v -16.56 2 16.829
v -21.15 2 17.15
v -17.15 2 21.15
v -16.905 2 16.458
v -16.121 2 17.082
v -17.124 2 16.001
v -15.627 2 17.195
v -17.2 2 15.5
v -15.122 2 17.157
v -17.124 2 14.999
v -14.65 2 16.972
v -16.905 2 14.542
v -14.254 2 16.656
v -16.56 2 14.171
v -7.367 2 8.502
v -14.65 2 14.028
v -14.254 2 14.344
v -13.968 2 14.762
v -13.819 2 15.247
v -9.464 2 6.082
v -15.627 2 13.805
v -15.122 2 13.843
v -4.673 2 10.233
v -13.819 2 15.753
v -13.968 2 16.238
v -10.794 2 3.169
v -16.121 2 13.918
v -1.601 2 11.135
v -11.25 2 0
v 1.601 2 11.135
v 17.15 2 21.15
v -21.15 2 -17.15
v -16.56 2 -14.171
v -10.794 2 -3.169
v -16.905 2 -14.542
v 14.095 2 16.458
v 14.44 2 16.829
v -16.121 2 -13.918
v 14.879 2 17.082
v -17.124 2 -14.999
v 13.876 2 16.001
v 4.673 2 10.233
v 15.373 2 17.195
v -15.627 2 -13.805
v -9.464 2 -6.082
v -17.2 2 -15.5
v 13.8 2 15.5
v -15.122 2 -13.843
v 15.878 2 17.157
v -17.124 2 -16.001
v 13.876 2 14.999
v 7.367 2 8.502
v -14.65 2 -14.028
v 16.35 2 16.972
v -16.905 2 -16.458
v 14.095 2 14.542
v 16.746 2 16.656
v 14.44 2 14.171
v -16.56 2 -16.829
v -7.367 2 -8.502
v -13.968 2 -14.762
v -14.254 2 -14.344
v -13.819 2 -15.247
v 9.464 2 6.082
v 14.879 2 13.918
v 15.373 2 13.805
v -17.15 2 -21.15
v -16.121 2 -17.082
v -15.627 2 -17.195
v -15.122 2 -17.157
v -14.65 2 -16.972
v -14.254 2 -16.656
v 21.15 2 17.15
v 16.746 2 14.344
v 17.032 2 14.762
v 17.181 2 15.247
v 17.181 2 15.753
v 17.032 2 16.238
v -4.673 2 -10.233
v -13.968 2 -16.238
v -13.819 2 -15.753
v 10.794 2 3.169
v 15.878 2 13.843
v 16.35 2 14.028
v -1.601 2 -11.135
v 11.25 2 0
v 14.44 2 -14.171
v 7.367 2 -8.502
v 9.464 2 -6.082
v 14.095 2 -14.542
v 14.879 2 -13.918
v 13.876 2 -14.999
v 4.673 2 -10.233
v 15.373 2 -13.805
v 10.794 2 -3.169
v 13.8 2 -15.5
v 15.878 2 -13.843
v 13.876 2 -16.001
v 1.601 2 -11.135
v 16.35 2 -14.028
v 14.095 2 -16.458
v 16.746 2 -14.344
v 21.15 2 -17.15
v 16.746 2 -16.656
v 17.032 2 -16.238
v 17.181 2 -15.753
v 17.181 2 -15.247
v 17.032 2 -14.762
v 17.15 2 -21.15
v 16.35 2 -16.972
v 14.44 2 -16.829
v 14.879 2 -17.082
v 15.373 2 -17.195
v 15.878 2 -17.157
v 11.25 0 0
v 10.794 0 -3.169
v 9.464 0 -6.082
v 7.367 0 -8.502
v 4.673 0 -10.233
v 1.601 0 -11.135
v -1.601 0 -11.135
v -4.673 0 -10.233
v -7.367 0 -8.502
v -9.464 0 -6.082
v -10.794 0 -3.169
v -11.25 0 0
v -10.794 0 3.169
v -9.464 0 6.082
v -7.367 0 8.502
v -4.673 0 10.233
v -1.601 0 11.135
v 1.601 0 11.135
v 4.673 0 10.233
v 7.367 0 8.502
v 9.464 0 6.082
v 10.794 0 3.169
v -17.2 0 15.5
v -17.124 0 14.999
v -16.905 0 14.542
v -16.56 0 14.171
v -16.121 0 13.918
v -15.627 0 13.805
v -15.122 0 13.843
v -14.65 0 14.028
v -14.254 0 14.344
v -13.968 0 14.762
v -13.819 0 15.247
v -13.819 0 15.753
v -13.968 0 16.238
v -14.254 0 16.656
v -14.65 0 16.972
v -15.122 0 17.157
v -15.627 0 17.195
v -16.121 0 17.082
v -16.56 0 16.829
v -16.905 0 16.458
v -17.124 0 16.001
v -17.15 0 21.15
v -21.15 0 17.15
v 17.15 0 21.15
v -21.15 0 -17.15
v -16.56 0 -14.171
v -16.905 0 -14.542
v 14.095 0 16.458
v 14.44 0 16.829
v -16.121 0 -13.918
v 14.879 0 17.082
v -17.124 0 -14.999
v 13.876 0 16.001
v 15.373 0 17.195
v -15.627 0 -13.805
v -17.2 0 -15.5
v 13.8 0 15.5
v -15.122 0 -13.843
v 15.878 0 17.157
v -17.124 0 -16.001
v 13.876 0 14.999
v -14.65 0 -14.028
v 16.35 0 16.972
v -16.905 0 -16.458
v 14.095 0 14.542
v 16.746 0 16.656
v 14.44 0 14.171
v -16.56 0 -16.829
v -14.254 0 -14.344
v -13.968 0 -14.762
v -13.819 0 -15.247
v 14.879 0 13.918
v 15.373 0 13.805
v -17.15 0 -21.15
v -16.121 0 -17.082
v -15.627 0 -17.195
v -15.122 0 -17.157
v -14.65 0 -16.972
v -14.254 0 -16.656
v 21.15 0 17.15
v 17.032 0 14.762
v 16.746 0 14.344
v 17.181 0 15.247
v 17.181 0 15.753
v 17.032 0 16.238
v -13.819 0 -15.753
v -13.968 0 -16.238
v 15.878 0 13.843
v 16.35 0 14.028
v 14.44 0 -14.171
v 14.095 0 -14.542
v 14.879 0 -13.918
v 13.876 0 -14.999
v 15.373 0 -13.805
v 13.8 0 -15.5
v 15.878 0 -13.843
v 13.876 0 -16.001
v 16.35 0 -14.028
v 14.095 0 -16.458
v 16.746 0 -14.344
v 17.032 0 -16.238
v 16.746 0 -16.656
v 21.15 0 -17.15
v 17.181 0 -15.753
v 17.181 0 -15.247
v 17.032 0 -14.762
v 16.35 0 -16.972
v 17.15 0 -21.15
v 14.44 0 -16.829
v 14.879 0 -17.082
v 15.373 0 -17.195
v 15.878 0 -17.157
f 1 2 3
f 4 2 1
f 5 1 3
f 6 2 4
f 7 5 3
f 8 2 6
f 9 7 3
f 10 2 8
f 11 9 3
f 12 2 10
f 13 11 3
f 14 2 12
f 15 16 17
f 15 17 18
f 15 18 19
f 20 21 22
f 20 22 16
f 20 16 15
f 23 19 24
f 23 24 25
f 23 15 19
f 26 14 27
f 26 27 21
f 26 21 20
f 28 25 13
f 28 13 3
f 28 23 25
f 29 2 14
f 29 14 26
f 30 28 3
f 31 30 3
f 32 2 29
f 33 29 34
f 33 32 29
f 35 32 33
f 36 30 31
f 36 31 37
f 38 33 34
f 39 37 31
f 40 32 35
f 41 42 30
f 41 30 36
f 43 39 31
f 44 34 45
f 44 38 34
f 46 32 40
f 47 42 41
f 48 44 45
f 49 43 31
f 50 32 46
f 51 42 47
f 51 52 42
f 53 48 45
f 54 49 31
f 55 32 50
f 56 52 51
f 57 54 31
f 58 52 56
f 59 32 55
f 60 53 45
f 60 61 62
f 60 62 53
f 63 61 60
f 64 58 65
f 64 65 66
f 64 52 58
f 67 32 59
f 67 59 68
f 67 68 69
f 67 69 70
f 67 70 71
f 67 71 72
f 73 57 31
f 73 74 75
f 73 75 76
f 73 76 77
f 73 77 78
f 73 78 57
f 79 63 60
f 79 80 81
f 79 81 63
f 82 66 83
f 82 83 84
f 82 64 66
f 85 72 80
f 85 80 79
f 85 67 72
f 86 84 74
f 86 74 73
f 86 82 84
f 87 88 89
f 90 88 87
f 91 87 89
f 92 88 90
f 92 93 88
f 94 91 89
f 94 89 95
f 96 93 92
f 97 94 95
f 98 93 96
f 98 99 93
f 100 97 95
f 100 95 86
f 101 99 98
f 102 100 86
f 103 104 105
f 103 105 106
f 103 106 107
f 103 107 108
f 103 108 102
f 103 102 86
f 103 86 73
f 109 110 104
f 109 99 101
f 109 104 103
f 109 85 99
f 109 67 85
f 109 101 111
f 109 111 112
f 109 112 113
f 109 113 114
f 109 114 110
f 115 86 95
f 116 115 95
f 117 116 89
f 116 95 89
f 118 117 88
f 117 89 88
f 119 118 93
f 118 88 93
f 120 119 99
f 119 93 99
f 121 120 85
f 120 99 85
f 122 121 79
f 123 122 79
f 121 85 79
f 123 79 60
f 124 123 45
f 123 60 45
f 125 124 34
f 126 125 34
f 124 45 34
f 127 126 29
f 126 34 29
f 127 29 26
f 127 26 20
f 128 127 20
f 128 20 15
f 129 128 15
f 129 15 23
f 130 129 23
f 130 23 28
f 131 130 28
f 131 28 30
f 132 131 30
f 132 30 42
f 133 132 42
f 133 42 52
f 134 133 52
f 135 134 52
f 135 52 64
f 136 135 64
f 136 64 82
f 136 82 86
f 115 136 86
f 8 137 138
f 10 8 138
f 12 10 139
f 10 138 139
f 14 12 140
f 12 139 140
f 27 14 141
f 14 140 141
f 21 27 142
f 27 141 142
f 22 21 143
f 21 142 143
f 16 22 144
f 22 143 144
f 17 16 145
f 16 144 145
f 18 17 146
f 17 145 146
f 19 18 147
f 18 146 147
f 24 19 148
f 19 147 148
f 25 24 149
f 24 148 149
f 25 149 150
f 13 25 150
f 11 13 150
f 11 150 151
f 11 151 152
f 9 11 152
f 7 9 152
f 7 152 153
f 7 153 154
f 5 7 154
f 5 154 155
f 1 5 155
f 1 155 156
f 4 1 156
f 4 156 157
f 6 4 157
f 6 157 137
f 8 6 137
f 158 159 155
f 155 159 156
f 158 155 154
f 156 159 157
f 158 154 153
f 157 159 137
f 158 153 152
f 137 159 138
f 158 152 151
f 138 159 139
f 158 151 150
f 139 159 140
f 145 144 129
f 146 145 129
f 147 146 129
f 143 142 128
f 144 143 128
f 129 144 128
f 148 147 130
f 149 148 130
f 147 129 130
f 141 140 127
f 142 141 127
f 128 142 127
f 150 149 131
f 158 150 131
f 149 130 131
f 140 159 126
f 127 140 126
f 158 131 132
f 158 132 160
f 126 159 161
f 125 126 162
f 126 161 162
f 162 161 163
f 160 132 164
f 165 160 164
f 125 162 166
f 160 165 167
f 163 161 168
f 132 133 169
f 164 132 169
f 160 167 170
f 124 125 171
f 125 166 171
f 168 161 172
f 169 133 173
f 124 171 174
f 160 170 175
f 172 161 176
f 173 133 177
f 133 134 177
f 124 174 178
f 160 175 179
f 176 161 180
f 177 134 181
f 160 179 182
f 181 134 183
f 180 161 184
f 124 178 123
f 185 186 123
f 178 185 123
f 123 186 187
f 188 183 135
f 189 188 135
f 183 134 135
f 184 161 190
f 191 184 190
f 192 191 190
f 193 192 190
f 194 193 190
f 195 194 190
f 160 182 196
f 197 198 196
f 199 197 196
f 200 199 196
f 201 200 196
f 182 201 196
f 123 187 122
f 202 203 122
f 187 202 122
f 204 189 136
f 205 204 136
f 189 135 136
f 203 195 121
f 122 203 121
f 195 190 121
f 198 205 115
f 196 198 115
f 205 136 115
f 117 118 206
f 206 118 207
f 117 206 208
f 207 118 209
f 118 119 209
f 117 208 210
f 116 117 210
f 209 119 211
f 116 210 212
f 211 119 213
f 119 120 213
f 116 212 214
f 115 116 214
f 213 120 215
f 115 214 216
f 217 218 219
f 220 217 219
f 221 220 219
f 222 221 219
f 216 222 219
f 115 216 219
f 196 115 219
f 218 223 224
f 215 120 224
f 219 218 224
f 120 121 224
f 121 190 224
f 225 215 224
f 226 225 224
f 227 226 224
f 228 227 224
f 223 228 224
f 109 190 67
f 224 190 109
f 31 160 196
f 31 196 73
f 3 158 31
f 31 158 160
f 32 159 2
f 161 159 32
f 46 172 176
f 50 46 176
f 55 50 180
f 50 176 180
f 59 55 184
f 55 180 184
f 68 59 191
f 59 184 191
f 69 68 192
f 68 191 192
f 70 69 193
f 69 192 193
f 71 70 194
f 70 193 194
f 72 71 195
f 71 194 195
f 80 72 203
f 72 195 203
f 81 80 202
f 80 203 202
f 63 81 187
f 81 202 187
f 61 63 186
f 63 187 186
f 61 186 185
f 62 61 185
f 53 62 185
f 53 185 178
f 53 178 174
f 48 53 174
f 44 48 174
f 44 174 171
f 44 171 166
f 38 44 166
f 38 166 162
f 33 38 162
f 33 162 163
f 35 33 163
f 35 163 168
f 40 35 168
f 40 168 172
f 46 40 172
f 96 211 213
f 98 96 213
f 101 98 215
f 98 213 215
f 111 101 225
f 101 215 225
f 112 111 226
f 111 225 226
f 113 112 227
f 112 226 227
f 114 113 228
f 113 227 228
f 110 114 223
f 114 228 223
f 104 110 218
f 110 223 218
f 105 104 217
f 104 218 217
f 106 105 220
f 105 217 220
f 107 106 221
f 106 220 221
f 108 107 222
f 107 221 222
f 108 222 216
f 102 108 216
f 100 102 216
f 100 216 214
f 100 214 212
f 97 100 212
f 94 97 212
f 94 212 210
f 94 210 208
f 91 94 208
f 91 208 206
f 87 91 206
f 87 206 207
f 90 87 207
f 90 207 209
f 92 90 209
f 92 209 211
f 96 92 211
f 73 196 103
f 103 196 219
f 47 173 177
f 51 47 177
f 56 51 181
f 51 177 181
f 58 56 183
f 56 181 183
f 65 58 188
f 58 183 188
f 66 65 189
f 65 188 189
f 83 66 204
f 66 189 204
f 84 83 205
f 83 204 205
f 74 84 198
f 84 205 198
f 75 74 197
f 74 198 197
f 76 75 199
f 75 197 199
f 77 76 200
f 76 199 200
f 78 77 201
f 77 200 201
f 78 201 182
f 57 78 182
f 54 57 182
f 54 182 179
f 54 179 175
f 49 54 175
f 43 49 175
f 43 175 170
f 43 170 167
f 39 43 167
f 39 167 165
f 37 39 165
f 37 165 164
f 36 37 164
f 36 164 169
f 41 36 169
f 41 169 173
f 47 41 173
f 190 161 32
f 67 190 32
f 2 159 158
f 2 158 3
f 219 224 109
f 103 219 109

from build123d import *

# Parameters (mm, degrees)
SKETCH1_W            = 42.3
SKETCH1_H            = 42.3
BOSS_EXTRUDE1_DEPTH  = 2
SKETCH2_R            = 11.25
CUT_EXTRUDE1_DEPTH   = 3
M3_CLEARANCE_HOLE1_D = 3.4
CHAMFER1_SIZE        = 4


with BuildPart() as part:
    # Sketch1 → Boss-Extrude1 (new body)
    with BuildSketch(Plane(origin=(0, 0, 0), x_dir=(1, 0, 0), z_dir=(0, 1, 0))):
        Rectangle(SKETCH1_W, SKETCH1_H)
    extrude(amount=BOSS_EXTRUDE1_DEPTH)

    # Sketch2 → Cut-Extrude1 (cut, through all)
    with BuildSketch(Plane(origin=(0, 2, 0), x_dir=(1, 0, 0), z_dir=(0, 1, 0))):
        Circle(SKETCH2_R)
    extrude(amount=-CUT_EXTRUDE1_DEPTH, mode=Mode.SUBTRACT)

    # M3 Clearance Hole1 (through all)
    with Locations(Plane(origin=(0, 2, 0), x_dir=(1, 0, 0), z_dir=(0, 1, 0))):
        with Locations((-15.5, 15.5), (15.5, 15.5), (15.5, -15.5), (-15.5, -15.5)):
            Hole(M3_CLEARANCE_HOLE1_D / 2)

    # Chamfer1
    chamfer1_edges = [part.edges().sort_by_distance(p)[0] for p in [
        (21.15, 1, 21.15),
        (-21.15, 1, 21.15),
        (-21.15, 1, -21.15),
        (21.15, 1, -21.15),
    ]]
    chamfer(chamfer1_edges, length=CHAMFER1_SIZE)


solid = part.part
